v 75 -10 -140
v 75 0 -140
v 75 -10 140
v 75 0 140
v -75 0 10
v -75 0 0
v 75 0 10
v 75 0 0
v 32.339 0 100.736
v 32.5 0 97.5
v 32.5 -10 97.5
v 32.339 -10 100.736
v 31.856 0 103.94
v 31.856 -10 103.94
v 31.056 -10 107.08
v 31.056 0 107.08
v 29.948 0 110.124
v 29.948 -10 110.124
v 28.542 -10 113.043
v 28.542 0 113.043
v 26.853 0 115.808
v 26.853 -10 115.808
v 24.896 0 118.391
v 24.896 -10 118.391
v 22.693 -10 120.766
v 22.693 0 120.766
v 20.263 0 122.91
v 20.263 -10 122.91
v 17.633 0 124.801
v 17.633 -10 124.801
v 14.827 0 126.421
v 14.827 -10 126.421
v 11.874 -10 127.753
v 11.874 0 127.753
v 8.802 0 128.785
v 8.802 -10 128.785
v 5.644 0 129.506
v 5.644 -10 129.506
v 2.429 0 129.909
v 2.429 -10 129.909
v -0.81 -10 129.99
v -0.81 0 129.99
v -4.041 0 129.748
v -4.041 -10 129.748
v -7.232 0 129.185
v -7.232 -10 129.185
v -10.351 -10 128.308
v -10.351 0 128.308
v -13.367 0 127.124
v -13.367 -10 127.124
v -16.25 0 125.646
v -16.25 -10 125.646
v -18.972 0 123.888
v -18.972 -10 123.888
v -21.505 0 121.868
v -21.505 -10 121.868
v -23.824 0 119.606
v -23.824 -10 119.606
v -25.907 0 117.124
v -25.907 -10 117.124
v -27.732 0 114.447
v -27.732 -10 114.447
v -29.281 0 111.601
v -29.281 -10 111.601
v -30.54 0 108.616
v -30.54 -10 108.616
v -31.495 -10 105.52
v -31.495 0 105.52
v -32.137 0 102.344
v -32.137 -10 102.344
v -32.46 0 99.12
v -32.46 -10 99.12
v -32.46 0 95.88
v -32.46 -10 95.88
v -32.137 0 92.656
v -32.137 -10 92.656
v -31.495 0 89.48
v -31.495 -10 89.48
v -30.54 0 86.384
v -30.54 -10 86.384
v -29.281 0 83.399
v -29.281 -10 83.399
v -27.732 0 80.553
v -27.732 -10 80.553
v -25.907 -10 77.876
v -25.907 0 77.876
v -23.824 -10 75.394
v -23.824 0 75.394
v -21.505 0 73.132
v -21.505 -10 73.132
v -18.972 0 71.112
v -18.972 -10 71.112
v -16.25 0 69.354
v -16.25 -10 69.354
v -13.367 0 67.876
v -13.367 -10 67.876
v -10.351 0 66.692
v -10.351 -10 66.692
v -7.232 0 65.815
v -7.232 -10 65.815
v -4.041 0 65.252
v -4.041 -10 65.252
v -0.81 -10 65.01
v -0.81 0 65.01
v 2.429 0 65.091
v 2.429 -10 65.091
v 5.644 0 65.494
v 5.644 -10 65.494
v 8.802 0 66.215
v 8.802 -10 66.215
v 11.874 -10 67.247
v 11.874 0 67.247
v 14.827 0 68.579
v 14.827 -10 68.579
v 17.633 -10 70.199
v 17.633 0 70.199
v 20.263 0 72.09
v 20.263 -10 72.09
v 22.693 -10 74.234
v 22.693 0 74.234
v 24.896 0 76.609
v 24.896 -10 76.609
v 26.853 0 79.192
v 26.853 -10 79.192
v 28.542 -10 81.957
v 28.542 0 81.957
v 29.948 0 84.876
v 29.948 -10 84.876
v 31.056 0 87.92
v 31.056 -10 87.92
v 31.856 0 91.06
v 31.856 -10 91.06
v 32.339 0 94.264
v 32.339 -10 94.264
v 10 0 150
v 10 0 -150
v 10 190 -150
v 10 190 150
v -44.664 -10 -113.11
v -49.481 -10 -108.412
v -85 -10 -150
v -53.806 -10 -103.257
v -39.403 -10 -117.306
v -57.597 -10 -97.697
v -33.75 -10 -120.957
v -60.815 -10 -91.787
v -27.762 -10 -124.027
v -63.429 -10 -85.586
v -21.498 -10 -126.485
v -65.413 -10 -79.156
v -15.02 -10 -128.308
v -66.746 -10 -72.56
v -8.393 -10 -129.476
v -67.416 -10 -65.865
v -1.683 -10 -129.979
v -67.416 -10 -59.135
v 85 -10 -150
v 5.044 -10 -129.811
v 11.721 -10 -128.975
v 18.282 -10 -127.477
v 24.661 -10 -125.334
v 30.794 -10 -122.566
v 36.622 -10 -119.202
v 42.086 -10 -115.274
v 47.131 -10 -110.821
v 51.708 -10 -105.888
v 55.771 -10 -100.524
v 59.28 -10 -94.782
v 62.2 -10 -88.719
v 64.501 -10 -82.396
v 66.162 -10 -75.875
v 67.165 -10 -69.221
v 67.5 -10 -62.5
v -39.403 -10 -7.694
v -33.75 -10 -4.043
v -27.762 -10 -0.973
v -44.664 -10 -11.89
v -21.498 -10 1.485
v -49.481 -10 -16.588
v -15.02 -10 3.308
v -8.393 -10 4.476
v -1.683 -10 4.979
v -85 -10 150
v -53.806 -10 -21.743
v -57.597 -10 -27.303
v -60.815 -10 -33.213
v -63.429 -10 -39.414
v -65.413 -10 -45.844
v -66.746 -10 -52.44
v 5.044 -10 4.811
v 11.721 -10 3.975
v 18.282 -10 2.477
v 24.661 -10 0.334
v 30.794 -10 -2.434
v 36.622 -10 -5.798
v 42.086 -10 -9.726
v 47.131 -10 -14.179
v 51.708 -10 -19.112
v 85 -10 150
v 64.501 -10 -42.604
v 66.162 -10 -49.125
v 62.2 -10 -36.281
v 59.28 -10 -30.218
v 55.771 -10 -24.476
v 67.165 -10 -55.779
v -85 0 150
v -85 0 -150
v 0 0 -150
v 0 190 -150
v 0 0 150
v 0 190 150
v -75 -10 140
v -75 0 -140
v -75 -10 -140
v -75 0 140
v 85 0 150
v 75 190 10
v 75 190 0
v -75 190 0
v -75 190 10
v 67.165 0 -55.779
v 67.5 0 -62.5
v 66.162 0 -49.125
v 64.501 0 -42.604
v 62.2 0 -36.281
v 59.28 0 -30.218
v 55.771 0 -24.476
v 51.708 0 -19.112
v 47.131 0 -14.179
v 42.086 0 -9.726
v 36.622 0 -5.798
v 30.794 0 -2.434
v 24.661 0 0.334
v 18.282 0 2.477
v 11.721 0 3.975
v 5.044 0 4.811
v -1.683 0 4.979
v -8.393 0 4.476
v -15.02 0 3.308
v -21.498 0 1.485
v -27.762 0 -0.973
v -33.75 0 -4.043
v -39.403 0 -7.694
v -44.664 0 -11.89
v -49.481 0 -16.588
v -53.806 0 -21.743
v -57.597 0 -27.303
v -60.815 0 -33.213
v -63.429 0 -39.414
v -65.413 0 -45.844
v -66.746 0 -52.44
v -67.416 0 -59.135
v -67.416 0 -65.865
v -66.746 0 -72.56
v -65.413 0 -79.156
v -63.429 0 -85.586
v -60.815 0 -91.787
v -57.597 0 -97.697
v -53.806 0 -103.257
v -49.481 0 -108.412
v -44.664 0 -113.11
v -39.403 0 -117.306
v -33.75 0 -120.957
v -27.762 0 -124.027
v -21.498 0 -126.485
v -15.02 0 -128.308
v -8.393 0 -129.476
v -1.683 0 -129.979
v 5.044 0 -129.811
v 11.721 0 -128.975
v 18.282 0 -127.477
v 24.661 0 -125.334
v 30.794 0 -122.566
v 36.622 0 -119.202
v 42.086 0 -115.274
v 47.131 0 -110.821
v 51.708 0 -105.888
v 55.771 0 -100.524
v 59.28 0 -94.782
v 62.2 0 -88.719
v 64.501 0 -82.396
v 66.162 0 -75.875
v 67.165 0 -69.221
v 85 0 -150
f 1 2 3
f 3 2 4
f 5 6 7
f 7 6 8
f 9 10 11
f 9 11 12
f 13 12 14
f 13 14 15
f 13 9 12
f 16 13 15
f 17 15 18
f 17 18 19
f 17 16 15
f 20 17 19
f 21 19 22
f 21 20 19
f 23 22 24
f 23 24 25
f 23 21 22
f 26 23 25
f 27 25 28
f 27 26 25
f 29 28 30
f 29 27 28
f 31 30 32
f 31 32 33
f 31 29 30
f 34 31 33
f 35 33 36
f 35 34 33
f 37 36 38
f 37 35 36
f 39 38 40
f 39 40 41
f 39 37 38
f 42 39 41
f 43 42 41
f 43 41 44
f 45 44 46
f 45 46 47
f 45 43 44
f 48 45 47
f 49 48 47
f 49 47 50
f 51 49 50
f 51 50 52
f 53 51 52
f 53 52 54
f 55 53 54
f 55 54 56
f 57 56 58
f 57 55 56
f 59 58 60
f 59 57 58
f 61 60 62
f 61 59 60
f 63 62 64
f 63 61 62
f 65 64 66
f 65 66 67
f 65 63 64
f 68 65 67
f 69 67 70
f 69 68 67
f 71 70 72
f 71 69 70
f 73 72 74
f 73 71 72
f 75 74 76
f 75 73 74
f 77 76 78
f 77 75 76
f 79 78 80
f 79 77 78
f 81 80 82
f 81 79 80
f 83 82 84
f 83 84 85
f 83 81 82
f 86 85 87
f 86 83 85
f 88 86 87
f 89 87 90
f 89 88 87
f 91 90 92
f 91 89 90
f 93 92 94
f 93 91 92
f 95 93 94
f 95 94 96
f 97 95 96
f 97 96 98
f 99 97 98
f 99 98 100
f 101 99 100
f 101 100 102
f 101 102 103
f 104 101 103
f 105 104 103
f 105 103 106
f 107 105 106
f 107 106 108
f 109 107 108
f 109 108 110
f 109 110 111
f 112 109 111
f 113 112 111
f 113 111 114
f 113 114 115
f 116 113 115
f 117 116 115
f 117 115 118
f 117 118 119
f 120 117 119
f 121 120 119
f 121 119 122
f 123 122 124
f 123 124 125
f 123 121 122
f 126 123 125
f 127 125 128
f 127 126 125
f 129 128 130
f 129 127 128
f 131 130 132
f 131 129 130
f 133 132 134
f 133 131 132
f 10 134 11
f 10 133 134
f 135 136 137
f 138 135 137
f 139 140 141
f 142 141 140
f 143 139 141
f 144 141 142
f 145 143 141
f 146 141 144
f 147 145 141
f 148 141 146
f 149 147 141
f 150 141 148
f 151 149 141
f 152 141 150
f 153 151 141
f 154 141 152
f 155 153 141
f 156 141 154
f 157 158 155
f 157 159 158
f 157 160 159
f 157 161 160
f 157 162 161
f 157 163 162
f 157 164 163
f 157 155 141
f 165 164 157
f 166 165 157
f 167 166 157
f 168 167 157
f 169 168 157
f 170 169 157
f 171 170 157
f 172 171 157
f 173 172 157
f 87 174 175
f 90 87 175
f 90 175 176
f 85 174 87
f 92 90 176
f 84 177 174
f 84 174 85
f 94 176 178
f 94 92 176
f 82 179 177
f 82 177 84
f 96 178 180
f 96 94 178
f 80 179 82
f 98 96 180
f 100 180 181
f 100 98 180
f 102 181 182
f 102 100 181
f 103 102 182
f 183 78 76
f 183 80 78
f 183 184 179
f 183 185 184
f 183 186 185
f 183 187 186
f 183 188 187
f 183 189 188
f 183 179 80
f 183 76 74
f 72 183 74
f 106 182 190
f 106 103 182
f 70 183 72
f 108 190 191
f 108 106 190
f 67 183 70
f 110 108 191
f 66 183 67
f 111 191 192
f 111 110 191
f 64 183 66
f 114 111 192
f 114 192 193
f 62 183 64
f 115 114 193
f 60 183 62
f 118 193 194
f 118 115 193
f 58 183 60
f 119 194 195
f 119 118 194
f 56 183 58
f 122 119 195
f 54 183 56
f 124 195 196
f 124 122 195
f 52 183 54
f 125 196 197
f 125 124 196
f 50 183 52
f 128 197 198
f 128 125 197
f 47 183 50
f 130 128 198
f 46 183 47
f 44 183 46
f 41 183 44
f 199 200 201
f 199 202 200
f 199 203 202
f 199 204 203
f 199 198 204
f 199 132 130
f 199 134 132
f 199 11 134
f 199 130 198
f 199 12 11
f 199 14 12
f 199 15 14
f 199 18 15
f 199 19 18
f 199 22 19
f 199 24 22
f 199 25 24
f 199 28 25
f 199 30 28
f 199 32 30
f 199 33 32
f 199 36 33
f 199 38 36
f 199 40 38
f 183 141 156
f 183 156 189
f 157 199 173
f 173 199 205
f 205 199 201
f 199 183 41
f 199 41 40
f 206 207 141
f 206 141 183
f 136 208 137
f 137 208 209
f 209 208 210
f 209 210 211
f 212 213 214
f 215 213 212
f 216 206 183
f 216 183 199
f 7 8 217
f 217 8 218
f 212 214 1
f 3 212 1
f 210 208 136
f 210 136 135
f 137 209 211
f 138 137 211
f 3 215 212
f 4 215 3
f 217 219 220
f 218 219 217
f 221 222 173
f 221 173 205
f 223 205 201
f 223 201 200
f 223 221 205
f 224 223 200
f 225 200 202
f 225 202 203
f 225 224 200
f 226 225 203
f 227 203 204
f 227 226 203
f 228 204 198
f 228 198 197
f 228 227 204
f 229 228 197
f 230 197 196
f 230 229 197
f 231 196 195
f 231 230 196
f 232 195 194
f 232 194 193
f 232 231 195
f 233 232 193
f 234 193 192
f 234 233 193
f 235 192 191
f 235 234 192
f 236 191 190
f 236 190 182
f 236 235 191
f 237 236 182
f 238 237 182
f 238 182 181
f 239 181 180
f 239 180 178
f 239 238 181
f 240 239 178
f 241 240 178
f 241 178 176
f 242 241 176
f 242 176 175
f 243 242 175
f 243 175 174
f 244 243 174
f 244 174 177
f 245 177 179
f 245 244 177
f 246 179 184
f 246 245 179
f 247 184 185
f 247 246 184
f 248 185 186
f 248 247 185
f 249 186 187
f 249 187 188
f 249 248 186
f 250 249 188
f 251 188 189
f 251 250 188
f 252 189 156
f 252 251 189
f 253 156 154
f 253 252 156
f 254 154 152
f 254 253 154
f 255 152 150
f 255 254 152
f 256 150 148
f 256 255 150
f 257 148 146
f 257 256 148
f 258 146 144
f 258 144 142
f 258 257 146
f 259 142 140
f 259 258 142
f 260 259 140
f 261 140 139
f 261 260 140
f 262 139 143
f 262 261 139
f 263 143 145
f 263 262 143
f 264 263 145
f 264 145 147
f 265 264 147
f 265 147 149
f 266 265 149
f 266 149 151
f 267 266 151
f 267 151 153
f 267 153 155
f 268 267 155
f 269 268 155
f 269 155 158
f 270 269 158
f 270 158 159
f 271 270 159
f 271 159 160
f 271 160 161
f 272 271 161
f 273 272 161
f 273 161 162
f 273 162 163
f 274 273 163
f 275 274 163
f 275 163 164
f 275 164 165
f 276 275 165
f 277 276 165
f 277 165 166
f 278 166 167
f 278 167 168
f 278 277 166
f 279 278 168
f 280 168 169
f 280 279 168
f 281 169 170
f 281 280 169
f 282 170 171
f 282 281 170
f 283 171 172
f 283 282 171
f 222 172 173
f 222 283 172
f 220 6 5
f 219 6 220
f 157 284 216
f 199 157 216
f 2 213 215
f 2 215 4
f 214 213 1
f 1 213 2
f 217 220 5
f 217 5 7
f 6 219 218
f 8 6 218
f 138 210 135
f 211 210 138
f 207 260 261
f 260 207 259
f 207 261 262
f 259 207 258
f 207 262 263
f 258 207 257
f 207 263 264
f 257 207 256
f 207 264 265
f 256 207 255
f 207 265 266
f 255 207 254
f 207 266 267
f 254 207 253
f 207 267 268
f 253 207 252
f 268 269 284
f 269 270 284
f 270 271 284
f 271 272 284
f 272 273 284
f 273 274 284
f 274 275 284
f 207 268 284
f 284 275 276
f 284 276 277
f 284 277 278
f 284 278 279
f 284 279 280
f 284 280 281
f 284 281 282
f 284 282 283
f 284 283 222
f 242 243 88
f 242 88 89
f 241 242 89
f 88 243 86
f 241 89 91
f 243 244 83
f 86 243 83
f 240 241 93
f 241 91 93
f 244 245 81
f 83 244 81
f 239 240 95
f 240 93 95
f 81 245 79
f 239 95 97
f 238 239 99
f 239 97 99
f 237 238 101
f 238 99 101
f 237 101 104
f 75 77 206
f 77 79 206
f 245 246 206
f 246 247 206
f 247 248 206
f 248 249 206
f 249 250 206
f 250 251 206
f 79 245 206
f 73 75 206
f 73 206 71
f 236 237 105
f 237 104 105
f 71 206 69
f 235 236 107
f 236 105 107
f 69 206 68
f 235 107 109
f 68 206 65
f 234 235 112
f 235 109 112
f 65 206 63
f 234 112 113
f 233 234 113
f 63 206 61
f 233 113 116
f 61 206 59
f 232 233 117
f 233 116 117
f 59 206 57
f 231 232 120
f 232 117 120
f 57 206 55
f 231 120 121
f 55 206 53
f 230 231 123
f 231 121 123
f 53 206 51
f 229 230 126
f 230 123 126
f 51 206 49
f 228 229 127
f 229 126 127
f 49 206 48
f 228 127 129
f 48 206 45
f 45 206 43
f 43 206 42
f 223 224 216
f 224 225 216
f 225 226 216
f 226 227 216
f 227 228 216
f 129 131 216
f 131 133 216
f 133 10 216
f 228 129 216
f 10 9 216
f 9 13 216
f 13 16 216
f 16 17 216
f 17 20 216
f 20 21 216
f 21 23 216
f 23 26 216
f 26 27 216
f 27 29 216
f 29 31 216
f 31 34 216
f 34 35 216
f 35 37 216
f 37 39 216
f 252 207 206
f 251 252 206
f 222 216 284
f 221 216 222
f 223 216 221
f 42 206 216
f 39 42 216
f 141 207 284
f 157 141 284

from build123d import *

# Parameters (mm, degrees)
F1_W     = 170
F1_H     = 300
F1_R     = 67.5
F1_R_2   = 32.5
F2_DEPTH = 10
F3_W     = 150
F3_H     = 190
F4_DEPTH = 10
F5_W     = 190
F5_H     = 300
F6_DEPTH = 10
F7_W     = 150
F7_H     = 280
F8_DEPTH = 10


with BuildPart() as f2:
    # F1 (on Front) → F2 (new body)
    with BuildSketch(Plane.XZ):
        Rectangle(F1_W, F1_H)
        with Locations((0, -62.5)):
            Circle(F1_R, mode=Mode.SUBTRACT)
        with Locations((0, 97.5)):
            Circle(F1_R_2, mode=Mode.SUBTRACT)
    extrude(amount=F2_DEPTH)


with BuildPart() as f4:
    # F3 (on Top) → F4 (new body)
    with BuildSketch(Plane.XY):
        with Locations((0, 95)):
            Rectangle(F3_W, F3_H)
    extrude(amount=F4_DEPTH)


with BuildPart() as f6:
    # F5 (on Right) → F6 (new body)
    with BuildSketch(Plane.YZ):
        with Locations((95, 0)):
            Rectangle(F5_W, F5_H)
    extrude(amount=F6_DEPTH)


with BuildPart() as f8:
    # F7 (on Front) → F8 (new body)
    with BuildSketch(Plane.XZ):
        Rectangle(F7_W, F7_H)
    extrude(amount=F8_DEPTH)


solid = Compound([f2.part, f4.part, f6.part, f8.part])
